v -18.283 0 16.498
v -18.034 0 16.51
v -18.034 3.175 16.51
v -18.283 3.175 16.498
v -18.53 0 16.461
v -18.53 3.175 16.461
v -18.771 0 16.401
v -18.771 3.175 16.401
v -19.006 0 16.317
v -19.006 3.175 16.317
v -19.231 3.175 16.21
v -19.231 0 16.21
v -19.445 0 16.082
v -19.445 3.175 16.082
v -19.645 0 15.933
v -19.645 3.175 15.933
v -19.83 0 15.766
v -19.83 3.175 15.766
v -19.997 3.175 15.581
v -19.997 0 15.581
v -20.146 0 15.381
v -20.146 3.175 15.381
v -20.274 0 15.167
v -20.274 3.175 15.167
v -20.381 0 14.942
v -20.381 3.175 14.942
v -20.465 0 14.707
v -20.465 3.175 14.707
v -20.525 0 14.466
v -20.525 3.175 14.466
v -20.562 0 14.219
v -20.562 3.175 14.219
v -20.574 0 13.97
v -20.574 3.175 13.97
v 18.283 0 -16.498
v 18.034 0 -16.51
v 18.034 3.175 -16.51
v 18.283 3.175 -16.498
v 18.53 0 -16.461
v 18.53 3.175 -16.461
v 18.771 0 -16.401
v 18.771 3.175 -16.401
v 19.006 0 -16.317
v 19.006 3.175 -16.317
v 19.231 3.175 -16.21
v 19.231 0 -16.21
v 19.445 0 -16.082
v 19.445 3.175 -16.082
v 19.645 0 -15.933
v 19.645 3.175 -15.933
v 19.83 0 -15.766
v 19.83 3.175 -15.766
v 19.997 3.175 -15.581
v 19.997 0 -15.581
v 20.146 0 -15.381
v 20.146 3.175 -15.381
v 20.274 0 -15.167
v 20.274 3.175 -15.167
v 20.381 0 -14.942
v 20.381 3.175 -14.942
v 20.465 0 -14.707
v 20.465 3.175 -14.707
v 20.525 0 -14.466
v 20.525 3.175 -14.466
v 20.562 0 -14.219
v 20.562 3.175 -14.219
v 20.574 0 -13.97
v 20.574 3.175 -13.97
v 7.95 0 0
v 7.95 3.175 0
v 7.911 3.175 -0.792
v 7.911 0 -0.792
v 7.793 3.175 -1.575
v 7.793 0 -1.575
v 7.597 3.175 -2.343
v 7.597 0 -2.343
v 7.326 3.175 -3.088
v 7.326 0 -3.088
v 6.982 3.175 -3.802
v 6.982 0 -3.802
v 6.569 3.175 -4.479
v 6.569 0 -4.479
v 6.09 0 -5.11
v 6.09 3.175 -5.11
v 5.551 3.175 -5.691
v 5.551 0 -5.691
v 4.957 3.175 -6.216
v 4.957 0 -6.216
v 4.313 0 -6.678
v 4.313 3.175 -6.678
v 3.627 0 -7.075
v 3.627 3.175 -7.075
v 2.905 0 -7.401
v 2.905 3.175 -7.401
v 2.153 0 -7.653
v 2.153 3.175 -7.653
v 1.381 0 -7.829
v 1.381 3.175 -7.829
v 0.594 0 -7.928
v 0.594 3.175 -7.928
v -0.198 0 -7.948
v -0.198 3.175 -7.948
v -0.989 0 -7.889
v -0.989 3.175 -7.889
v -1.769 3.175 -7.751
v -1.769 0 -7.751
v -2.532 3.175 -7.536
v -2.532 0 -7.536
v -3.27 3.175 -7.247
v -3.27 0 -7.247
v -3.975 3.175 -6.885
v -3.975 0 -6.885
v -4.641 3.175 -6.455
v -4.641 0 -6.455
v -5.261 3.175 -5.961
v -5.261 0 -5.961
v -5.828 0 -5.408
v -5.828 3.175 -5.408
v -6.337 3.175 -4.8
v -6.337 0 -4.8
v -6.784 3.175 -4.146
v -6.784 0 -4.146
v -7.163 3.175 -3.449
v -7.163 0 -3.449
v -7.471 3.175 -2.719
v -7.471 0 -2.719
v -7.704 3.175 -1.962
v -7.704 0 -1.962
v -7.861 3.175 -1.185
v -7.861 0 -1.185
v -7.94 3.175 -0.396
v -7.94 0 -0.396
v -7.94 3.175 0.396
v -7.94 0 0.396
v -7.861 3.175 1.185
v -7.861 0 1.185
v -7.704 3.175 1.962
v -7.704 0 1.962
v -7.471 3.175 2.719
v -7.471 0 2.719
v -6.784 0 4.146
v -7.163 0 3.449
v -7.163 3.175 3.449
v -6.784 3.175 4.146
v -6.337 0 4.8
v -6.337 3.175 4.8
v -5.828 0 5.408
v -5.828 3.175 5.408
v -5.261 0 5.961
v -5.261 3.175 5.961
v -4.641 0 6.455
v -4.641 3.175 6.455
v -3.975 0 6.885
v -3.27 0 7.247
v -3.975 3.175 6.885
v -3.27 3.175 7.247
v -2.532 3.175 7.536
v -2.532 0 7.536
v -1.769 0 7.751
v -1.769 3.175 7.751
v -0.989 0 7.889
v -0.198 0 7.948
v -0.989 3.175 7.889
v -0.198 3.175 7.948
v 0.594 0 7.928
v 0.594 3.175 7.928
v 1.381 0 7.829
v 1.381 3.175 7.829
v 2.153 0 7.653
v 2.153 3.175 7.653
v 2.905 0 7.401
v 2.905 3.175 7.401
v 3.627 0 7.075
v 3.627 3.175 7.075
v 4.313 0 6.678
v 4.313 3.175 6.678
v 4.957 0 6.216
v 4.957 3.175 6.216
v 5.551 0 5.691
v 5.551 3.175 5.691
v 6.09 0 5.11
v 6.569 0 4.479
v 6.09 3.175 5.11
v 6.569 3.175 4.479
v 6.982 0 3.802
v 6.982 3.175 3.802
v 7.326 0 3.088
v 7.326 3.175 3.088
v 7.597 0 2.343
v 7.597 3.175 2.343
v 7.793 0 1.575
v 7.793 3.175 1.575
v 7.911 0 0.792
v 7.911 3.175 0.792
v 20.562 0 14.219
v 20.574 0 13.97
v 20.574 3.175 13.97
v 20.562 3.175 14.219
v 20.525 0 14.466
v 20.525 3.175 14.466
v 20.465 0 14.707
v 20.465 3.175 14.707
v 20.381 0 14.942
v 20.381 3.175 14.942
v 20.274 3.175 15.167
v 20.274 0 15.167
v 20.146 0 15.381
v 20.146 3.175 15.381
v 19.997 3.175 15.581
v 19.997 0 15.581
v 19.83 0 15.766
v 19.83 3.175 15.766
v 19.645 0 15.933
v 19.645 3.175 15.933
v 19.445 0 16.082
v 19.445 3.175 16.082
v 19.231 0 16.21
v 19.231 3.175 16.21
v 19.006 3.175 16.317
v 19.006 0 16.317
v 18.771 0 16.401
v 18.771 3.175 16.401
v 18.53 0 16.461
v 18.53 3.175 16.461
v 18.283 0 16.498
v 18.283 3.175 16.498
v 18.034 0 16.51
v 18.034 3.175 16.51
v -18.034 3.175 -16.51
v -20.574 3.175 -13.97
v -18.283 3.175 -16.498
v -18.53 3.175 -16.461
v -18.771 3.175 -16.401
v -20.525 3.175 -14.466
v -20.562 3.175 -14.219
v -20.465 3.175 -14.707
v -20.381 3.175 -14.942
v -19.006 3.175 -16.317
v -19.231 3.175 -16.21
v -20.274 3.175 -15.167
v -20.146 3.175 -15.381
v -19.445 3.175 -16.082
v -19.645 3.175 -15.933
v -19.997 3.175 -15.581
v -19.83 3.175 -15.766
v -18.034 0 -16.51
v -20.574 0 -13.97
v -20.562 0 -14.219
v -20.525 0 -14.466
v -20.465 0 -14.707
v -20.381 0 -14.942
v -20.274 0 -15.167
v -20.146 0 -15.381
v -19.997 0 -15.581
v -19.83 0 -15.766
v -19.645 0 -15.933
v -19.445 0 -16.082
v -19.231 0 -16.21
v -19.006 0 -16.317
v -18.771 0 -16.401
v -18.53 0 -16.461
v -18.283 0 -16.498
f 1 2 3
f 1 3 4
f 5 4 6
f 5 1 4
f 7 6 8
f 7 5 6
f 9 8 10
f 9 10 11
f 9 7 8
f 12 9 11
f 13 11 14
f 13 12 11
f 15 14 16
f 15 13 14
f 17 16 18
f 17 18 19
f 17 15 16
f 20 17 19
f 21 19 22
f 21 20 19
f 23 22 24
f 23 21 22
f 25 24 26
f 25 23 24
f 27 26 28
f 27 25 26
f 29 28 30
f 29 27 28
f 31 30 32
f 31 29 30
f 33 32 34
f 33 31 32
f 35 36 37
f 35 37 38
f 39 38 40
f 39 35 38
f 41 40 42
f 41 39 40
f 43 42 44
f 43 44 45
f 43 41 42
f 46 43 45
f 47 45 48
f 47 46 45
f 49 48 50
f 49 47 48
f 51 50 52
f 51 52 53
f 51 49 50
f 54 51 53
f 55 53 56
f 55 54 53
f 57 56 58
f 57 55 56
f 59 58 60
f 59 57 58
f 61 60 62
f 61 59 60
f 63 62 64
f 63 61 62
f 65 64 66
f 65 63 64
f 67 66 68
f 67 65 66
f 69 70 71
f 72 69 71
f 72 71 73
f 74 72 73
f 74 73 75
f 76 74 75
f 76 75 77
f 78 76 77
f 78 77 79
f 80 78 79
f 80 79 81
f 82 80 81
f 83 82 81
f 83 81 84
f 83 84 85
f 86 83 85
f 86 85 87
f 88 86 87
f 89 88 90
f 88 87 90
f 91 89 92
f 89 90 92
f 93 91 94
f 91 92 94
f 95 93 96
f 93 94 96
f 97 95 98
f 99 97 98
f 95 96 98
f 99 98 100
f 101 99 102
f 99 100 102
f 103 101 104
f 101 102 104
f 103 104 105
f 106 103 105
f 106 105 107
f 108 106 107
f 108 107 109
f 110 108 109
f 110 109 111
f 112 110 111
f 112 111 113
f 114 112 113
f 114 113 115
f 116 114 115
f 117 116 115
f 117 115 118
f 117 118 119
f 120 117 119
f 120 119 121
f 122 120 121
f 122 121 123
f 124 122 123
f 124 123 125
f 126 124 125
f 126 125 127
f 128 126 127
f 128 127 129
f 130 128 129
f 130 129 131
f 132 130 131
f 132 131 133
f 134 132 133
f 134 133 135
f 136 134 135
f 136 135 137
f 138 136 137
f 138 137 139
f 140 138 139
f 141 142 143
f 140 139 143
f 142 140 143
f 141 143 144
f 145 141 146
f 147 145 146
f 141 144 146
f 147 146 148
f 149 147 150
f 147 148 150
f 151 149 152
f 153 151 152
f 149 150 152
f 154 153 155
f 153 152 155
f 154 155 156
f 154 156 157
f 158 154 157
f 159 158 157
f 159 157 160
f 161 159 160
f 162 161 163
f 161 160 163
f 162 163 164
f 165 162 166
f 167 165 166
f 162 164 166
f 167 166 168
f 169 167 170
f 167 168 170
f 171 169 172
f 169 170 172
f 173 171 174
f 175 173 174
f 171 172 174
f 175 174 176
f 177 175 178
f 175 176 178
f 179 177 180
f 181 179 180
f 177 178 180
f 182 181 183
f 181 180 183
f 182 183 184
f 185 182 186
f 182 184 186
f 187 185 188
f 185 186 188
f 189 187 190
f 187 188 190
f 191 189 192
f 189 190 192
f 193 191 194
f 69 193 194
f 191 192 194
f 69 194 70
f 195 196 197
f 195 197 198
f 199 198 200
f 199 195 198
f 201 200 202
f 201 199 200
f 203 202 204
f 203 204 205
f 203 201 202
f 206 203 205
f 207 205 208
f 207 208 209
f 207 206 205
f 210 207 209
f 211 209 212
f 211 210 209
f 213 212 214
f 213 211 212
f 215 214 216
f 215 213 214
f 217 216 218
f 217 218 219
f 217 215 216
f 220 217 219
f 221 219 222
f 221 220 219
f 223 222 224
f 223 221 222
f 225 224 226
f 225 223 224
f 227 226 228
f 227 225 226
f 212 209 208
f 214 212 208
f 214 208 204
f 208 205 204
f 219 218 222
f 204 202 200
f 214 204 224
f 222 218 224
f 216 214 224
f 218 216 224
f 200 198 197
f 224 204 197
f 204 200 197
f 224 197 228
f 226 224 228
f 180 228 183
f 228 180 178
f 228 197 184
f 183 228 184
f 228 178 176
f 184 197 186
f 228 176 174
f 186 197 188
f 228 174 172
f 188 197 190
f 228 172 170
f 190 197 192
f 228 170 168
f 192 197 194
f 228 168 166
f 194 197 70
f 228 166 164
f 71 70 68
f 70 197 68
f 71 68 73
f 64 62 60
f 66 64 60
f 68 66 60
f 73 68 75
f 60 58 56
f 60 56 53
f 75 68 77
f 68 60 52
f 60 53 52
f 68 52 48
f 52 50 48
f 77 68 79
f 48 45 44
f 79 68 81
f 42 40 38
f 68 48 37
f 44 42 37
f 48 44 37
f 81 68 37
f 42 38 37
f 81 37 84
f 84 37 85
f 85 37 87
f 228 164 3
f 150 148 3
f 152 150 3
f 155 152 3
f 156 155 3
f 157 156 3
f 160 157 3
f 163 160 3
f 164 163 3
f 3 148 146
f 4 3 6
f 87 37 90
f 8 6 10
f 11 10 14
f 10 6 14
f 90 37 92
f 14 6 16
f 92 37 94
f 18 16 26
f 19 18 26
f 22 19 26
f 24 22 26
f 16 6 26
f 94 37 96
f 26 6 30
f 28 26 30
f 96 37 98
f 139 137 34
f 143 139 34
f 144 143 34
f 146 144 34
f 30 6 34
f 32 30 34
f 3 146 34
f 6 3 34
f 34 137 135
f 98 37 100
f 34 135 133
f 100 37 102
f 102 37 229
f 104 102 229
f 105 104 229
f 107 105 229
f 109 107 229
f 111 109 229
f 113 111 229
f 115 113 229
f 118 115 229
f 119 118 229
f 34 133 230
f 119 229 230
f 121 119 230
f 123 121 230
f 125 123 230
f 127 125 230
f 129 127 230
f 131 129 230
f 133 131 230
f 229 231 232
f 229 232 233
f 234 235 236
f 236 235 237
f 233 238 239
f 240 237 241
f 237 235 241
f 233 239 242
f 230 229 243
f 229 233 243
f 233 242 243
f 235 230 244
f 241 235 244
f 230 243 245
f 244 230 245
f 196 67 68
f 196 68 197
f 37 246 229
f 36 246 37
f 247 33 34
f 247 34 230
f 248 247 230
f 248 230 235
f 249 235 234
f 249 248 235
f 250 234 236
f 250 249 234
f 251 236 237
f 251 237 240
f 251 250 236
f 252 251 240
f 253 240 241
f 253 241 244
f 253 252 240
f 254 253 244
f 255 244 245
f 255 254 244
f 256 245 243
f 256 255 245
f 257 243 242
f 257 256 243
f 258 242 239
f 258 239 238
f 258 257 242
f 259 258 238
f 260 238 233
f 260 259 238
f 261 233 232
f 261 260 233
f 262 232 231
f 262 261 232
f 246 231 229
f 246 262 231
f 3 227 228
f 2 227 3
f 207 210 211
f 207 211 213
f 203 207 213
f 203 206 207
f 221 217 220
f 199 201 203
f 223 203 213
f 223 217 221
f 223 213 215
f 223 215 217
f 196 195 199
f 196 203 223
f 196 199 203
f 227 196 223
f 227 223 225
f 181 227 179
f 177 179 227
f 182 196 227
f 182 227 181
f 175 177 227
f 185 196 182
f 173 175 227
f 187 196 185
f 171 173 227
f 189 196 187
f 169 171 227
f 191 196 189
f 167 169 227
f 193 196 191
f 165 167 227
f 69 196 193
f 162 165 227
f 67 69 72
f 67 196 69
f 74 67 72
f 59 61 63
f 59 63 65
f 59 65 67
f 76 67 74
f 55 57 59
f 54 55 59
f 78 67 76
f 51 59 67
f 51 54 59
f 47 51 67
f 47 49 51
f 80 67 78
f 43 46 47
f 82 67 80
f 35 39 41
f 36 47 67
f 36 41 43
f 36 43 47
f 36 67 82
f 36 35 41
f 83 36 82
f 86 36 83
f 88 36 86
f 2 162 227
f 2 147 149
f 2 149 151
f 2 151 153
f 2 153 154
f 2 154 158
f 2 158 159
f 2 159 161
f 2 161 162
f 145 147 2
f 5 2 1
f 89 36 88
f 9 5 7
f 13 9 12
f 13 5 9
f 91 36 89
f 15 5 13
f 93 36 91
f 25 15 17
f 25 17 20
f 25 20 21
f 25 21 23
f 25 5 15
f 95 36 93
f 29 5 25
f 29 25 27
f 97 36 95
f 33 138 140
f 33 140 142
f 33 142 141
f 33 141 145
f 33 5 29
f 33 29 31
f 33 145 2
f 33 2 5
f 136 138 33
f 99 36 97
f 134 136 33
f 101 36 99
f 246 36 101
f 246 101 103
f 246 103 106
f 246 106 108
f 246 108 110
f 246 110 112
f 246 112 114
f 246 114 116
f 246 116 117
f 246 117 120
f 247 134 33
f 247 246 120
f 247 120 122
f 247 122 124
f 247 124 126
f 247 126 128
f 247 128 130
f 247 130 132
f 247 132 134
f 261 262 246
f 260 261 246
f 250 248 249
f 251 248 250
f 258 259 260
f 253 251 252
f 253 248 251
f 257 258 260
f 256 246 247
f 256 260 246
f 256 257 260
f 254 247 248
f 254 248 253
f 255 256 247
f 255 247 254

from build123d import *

# Parameters (mm, degrees)
BOSS_EXTRUDE1_DEPTH = 3.175
SKETCH2_R           = 7.9502
CUT_EXTRUDE1_DEPTH  = 4.175


with BuildPart() as part:
    # Sketch1 → Boss-Extrude1 (new body)
    with BuildSketch(Plane(origin=(0, 0, 0), x_dir=(1, 0, 0), z_dir=(0, 1, 0))):
        with BuildLine():
            Line((18.034, -16.51), (-18.034, -16.51))
            ThreePointArc((-18.034, -16.51), (-19.830051224, -15.766051224), (-20.574, -13.97))
            Line((-20.574, -13.97), (-20.574, 13.97))
            ThreePointArc((-20.574, 13.97), (-19.830051224, 15.766051224), (-18.034, 16.51))
            Line((-18.034, 16.51), (18.034, 16.51))
            ThreePointArc((18.034, 16.51), (19.830051224, 15.766051224), (20.574, 13.97))
            Line((20.574, 13.97), (20.574, -13.97))
            ThreePointArc((20.574, -13.97), (19.830051224, -15.766051224), (18.034, -16.51))
        make_face()
    extrude(amount=BOSS_EXTRUDE1_DEPTH)

    # Sketch2 → Cut-Extrude1 (cut, through all)
    with BuildSketch(Plane(origin=(0, 3.175, 0), x_dir=(1, 0, 0), z_dir=(0, 1, 0))):
        Circle(SKETCH2_R)
    extrude(amount=-CUT_EXTRUDE1_DEPTH, mode=Mode.SUBTRACT)


solid = part.part
